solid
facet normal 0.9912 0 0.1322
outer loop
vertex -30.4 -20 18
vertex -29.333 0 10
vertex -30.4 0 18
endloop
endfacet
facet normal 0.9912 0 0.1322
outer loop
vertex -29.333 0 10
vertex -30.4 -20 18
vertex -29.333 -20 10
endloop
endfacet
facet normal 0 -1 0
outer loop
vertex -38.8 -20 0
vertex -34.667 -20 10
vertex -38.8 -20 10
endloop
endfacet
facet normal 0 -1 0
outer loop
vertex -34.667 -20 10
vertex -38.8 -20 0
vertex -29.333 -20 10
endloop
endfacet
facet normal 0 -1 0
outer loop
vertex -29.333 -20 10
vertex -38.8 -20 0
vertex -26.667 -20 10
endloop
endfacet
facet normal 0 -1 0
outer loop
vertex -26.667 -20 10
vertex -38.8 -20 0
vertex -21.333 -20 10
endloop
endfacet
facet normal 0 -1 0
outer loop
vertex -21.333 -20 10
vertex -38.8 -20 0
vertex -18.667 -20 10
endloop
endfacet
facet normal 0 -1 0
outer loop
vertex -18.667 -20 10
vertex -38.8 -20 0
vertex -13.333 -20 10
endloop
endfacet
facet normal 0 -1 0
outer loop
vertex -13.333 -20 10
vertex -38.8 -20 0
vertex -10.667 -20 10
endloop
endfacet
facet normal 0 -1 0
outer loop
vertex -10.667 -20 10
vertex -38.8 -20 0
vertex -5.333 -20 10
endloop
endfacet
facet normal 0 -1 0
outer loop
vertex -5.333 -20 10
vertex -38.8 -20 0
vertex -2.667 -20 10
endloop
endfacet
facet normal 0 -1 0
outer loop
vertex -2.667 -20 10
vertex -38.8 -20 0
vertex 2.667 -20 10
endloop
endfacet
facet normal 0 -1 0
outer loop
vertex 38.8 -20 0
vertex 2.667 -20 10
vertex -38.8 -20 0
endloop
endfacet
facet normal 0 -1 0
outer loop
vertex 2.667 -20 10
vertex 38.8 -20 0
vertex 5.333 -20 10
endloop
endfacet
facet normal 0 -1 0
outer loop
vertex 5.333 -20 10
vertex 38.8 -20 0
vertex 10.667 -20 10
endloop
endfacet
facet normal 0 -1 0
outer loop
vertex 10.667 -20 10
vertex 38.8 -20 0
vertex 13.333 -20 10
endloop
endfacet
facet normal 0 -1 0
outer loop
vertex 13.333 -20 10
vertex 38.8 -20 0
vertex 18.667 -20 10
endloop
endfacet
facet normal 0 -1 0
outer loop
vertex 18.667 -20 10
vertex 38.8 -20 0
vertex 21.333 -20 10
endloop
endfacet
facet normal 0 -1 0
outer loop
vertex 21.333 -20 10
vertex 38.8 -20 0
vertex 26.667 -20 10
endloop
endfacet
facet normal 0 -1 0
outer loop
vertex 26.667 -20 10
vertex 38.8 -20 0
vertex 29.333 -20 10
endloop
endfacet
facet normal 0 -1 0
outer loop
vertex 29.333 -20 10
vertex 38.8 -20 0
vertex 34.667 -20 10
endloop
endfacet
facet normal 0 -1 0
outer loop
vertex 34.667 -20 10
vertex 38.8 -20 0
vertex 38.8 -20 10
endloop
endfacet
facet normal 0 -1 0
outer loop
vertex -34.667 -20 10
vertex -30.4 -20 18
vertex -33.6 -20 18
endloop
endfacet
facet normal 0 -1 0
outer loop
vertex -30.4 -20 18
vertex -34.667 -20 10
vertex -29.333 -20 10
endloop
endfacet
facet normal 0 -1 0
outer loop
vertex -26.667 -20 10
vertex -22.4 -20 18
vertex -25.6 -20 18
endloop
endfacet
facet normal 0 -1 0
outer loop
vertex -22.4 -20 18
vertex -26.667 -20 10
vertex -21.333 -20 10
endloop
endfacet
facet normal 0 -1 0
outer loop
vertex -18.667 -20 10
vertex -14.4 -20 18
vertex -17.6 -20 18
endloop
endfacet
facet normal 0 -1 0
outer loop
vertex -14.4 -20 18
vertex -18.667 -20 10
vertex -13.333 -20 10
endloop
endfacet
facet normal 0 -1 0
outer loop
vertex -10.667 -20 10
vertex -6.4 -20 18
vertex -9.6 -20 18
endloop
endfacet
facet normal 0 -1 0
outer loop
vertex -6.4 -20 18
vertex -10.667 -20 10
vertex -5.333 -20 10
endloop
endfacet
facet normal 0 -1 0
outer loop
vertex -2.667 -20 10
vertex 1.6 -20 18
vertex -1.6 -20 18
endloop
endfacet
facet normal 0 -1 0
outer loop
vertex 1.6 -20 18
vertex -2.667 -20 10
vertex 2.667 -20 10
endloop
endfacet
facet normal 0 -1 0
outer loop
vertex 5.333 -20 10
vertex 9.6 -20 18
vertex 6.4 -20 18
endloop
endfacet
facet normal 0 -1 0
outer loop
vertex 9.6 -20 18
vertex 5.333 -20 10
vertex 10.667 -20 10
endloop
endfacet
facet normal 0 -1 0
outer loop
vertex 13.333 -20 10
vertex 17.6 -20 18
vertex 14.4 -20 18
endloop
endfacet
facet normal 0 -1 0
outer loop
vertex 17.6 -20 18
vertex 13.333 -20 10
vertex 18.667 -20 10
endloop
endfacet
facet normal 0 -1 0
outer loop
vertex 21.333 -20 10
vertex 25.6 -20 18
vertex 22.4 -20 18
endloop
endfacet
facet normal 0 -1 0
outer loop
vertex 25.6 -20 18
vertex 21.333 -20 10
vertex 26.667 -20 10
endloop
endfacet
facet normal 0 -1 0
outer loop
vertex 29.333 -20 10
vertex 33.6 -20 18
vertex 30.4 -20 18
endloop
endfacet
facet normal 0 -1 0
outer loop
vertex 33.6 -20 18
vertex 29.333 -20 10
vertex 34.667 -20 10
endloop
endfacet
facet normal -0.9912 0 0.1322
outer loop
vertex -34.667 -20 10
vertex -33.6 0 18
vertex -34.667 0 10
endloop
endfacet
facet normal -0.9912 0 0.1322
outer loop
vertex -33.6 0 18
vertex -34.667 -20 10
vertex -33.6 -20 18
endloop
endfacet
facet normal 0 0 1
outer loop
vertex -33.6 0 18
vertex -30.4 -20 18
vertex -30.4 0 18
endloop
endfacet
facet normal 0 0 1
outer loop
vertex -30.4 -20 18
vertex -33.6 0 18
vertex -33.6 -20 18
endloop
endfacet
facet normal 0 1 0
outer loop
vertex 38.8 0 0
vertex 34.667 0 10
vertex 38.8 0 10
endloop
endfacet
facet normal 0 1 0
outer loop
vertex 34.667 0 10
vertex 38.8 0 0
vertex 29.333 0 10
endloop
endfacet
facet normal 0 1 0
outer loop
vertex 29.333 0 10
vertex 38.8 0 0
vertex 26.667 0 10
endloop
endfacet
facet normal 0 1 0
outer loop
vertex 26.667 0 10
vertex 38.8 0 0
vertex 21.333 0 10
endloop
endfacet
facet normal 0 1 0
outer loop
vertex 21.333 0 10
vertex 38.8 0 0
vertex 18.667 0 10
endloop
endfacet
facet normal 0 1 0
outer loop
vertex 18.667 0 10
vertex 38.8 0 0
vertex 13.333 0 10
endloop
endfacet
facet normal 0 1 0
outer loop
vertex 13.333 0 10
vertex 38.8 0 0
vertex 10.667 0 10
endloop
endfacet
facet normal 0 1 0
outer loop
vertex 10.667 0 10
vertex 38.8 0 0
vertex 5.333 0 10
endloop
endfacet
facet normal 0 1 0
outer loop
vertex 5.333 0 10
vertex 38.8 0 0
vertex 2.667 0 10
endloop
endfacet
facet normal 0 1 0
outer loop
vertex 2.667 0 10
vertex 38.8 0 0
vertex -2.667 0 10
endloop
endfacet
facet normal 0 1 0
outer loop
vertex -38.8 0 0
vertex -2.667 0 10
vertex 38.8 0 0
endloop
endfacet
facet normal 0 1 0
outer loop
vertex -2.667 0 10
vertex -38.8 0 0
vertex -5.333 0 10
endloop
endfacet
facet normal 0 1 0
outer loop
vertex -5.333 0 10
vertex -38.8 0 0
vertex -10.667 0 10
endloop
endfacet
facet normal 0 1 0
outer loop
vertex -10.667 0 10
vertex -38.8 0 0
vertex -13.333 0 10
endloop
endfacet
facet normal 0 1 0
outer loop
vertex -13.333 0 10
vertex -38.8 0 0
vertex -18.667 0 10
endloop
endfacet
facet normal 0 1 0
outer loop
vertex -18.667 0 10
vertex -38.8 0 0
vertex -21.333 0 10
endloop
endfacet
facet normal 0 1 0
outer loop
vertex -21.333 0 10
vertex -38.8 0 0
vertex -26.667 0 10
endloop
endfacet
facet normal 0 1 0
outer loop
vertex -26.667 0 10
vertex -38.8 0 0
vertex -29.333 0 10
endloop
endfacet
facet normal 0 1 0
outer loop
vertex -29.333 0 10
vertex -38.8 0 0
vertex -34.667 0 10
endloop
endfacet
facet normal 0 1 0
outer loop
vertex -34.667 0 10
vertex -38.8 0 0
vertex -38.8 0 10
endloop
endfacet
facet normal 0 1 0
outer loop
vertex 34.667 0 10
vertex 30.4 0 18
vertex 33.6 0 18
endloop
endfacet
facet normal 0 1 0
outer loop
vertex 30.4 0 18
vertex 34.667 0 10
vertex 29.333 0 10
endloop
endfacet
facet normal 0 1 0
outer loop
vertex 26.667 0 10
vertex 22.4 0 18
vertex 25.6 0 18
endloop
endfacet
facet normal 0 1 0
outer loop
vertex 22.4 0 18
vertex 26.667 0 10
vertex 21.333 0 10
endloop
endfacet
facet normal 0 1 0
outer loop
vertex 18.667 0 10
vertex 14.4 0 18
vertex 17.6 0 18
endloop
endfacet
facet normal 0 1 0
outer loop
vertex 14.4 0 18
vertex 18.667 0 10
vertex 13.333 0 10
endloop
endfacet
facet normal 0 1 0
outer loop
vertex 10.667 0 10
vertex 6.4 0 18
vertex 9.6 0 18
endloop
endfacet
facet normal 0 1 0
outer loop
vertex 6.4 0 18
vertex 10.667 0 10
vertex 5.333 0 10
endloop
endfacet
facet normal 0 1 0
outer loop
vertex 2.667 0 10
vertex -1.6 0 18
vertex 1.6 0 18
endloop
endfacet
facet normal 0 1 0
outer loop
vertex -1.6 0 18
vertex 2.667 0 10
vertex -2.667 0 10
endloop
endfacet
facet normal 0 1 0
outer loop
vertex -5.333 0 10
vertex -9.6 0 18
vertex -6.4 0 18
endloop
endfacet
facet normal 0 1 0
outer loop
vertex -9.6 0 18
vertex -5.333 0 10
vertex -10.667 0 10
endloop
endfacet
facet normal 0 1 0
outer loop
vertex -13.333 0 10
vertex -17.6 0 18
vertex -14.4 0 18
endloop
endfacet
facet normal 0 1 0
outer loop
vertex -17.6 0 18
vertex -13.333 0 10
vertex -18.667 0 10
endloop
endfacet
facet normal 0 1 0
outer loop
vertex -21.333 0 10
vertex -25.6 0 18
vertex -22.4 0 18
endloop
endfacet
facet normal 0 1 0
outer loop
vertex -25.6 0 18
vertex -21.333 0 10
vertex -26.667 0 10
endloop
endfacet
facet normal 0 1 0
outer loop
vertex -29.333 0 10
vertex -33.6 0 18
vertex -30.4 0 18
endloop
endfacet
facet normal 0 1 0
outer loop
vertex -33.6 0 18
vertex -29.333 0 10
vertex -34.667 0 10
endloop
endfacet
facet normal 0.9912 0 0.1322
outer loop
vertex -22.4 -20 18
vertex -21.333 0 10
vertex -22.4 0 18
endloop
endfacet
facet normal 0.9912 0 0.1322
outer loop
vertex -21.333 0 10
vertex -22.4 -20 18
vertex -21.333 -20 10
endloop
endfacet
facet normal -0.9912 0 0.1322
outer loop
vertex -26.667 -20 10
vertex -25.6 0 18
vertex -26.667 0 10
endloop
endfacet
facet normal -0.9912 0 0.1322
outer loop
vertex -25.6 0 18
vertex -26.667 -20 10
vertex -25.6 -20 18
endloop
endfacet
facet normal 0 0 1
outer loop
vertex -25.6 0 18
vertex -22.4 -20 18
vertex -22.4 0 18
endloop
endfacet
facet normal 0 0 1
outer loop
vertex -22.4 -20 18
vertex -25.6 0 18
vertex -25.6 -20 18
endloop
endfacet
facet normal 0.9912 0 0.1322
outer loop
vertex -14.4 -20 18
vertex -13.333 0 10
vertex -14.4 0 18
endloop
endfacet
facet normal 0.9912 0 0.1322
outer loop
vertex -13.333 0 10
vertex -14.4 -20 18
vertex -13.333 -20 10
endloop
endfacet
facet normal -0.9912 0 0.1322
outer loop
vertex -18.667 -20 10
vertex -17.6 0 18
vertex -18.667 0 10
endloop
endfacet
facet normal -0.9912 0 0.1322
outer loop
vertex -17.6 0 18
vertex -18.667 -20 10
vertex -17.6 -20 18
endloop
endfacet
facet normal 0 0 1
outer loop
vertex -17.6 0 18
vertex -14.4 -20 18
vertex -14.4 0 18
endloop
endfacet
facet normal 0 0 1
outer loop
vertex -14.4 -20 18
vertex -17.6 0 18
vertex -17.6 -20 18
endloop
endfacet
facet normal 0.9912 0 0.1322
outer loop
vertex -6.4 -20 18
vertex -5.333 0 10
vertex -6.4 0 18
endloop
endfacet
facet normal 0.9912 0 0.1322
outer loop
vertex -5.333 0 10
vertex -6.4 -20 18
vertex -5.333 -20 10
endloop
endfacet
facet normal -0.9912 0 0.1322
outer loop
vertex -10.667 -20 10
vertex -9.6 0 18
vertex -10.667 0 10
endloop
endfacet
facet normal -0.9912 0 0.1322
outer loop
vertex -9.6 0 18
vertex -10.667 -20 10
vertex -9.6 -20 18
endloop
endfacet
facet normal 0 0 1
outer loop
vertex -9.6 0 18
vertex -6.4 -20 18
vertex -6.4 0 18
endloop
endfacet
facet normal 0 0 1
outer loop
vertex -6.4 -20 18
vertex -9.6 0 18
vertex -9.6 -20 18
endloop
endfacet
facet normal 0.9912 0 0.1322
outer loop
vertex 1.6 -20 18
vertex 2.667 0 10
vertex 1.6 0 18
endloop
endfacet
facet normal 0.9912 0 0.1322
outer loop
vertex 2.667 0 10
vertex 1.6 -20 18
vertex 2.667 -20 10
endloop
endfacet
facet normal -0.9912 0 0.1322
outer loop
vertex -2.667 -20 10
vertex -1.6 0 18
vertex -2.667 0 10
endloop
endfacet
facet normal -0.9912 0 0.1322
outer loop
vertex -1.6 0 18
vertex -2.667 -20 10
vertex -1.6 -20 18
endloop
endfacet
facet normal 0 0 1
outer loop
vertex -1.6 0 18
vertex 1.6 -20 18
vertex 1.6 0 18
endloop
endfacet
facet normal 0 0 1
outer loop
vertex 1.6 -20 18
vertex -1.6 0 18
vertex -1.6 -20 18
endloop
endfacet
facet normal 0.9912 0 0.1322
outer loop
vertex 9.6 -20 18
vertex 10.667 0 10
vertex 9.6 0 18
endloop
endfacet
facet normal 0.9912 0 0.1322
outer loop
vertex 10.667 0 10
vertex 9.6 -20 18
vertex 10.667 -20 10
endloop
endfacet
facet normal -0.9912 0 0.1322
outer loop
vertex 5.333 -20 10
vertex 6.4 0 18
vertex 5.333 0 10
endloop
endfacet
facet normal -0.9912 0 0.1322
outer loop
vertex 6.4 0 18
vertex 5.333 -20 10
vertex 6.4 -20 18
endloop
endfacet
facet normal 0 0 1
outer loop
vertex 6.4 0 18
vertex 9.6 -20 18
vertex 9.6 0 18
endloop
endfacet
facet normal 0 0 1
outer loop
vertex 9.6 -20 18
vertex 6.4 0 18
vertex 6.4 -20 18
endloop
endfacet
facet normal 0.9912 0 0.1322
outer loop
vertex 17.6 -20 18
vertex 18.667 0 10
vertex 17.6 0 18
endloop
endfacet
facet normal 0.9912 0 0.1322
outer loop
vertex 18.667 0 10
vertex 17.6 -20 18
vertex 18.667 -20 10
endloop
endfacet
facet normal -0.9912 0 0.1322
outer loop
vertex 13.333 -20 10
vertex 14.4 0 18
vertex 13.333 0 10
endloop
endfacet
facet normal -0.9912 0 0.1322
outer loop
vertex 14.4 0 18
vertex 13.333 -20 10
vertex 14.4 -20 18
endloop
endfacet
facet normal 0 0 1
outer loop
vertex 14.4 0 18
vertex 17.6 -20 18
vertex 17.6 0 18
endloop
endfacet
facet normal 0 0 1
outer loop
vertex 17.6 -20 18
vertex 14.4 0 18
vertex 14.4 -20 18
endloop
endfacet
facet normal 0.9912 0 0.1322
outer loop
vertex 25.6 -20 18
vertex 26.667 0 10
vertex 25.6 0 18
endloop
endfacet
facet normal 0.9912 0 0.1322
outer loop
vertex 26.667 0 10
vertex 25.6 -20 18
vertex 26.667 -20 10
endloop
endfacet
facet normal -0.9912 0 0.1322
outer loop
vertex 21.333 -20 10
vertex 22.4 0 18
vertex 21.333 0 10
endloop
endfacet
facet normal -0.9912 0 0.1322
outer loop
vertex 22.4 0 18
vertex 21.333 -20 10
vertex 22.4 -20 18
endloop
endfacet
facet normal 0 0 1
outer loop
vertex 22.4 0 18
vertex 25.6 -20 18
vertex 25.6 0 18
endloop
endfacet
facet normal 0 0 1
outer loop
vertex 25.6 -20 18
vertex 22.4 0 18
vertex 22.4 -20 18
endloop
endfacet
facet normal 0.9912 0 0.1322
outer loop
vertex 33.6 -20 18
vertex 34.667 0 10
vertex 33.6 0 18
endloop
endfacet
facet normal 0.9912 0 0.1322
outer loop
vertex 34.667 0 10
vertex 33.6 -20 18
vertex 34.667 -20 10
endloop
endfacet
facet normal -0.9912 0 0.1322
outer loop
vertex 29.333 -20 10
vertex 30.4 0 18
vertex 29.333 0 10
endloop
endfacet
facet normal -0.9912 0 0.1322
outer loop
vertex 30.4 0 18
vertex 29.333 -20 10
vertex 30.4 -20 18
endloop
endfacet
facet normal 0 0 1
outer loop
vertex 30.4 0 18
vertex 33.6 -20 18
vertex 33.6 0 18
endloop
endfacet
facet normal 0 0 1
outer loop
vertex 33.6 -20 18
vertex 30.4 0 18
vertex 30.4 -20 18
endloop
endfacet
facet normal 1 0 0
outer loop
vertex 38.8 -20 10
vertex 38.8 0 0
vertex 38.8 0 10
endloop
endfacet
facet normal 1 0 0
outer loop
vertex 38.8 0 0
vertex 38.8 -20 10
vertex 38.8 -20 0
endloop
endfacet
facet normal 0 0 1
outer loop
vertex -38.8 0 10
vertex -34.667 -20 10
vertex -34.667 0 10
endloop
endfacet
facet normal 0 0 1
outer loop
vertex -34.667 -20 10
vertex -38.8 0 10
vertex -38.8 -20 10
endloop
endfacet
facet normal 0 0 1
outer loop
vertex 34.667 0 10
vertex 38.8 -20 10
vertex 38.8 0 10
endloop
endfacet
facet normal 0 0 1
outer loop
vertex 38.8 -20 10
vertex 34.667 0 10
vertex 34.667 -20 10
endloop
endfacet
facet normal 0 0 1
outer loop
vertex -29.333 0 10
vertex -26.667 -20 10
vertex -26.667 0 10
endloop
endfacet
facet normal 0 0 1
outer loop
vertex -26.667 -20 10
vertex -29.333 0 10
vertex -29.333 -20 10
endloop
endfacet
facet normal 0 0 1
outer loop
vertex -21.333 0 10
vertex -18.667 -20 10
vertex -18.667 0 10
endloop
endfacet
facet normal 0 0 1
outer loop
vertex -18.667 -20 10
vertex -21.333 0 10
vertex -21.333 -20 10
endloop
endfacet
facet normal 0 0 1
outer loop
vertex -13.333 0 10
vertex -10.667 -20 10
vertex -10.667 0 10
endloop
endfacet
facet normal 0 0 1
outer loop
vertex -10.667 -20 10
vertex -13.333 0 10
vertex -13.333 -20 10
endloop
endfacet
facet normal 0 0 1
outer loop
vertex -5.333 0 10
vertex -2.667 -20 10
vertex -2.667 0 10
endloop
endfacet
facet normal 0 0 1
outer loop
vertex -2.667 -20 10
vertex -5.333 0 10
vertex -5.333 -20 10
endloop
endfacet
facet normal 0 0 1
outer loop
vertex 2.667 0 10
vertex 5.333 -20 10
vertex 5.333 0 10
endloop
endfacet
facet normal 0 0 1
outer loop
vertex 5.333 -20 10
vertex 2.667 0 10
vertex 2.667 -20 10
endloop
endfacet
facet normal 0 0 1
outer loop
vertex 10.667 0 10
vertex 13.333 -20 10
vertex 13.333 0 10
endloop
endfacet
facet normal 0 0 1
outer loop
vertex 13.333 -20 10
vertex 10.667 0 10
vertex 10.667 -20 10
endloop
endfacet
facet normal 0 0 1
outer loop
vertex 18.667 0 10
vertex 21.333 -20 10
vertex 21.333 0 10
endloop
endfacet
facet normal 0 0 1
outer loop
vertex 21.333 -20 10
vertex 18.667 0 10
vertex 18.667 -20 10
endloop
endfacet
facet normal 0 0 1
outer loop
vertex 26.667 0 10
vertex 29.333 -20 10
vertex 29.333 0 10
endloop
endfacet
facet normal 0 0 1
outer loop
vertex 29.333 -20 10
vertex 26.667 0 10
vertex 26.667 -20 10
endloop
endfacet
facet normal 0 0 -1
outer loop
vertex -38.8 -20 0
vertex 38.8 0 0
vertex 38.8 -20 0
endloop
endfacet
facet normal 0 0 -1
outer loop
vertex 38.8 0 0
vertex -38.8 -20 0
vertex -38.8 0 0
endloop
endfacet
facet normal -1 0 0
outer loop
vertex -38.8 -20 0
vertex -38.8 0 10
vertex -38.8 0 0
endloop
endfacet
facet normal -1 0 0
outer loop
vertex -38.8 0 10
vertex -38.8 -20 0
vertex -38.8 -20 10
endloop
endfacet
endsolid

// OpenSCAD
$fn = 32;

// ----------------------------------------------------------------------
// Toothed rack, 9 teeth
// 8 mm pitch, 8 mm teeth
// ----------------------------------------------------------------------

// --- parameters (mm) ---
bar_w = 20;     // bar width (Y)
bar_h = 10;     // bar height (Z)
teeth = 9;      // number of teeth
pitch = 8;      // tooth pitch
tooth_h = 8;    // tooth height above the bar
root_w = 5.6;   // tooth width at the root
crest_w = 3.2;  // tooth width at the crest

// --- derived feature positions (mm) ---
span = (teeth - 1) * pitch;  // = 64   distance between the outer teeth
bar_l = span + root_w + 8;   // = 77.6   bar length: teeth plus 4 mm at each end
tooth_x = -span / 2;         // = -32   X of the first tooth
height = bar_h + tooth_h;    // = 18   overall height
feature_centers = [
  [tooth_x + 0 * pitch, -bar_w / 2],
  [tooth_x + 1 * pitch, -bar_w / 2],
  [tooth_x + 2 * pitch, -bar_w / 2],
  [tooth_x + 3 * pitch, -bar_w / 2],
  [tooth_x + 4 * pitch, -bar_w / 2],
  [tooth_x + 5 * pitch, -bar_w / 2],
  [tooth_x + 6 * pitch, -bar_w / 2],
  [tooth_x + 7 * pitch, -bar_w / 2],
  [tooth_x + 8 * pitch, -bar_w / 2]
];   // tooth centre line, drives the tooth loop

// bar with a rack of teeth, one extruded trapezoium per centre
module rack_tooth() {
  linear_extrude(height = bar_w)
    polygon(points = [
      [0, 0],
      [root_w, 0],
      [root_w / 2 + crest_w / 2, tooth_h + 1],
      [root_w / 2 - crest_w / 2, tooth_h + 1]
    ]);
}

union() {
  translate([-bar_l / 2, -bar_w, 0]) cube([bar_l, bar_w, bar_h]);
  for (centre = feature_centers)
    translate([centre[0] - root_w / 2, 0, bar_h - 1]) rotate([90, 0, 0]) rack_tooth();
}
